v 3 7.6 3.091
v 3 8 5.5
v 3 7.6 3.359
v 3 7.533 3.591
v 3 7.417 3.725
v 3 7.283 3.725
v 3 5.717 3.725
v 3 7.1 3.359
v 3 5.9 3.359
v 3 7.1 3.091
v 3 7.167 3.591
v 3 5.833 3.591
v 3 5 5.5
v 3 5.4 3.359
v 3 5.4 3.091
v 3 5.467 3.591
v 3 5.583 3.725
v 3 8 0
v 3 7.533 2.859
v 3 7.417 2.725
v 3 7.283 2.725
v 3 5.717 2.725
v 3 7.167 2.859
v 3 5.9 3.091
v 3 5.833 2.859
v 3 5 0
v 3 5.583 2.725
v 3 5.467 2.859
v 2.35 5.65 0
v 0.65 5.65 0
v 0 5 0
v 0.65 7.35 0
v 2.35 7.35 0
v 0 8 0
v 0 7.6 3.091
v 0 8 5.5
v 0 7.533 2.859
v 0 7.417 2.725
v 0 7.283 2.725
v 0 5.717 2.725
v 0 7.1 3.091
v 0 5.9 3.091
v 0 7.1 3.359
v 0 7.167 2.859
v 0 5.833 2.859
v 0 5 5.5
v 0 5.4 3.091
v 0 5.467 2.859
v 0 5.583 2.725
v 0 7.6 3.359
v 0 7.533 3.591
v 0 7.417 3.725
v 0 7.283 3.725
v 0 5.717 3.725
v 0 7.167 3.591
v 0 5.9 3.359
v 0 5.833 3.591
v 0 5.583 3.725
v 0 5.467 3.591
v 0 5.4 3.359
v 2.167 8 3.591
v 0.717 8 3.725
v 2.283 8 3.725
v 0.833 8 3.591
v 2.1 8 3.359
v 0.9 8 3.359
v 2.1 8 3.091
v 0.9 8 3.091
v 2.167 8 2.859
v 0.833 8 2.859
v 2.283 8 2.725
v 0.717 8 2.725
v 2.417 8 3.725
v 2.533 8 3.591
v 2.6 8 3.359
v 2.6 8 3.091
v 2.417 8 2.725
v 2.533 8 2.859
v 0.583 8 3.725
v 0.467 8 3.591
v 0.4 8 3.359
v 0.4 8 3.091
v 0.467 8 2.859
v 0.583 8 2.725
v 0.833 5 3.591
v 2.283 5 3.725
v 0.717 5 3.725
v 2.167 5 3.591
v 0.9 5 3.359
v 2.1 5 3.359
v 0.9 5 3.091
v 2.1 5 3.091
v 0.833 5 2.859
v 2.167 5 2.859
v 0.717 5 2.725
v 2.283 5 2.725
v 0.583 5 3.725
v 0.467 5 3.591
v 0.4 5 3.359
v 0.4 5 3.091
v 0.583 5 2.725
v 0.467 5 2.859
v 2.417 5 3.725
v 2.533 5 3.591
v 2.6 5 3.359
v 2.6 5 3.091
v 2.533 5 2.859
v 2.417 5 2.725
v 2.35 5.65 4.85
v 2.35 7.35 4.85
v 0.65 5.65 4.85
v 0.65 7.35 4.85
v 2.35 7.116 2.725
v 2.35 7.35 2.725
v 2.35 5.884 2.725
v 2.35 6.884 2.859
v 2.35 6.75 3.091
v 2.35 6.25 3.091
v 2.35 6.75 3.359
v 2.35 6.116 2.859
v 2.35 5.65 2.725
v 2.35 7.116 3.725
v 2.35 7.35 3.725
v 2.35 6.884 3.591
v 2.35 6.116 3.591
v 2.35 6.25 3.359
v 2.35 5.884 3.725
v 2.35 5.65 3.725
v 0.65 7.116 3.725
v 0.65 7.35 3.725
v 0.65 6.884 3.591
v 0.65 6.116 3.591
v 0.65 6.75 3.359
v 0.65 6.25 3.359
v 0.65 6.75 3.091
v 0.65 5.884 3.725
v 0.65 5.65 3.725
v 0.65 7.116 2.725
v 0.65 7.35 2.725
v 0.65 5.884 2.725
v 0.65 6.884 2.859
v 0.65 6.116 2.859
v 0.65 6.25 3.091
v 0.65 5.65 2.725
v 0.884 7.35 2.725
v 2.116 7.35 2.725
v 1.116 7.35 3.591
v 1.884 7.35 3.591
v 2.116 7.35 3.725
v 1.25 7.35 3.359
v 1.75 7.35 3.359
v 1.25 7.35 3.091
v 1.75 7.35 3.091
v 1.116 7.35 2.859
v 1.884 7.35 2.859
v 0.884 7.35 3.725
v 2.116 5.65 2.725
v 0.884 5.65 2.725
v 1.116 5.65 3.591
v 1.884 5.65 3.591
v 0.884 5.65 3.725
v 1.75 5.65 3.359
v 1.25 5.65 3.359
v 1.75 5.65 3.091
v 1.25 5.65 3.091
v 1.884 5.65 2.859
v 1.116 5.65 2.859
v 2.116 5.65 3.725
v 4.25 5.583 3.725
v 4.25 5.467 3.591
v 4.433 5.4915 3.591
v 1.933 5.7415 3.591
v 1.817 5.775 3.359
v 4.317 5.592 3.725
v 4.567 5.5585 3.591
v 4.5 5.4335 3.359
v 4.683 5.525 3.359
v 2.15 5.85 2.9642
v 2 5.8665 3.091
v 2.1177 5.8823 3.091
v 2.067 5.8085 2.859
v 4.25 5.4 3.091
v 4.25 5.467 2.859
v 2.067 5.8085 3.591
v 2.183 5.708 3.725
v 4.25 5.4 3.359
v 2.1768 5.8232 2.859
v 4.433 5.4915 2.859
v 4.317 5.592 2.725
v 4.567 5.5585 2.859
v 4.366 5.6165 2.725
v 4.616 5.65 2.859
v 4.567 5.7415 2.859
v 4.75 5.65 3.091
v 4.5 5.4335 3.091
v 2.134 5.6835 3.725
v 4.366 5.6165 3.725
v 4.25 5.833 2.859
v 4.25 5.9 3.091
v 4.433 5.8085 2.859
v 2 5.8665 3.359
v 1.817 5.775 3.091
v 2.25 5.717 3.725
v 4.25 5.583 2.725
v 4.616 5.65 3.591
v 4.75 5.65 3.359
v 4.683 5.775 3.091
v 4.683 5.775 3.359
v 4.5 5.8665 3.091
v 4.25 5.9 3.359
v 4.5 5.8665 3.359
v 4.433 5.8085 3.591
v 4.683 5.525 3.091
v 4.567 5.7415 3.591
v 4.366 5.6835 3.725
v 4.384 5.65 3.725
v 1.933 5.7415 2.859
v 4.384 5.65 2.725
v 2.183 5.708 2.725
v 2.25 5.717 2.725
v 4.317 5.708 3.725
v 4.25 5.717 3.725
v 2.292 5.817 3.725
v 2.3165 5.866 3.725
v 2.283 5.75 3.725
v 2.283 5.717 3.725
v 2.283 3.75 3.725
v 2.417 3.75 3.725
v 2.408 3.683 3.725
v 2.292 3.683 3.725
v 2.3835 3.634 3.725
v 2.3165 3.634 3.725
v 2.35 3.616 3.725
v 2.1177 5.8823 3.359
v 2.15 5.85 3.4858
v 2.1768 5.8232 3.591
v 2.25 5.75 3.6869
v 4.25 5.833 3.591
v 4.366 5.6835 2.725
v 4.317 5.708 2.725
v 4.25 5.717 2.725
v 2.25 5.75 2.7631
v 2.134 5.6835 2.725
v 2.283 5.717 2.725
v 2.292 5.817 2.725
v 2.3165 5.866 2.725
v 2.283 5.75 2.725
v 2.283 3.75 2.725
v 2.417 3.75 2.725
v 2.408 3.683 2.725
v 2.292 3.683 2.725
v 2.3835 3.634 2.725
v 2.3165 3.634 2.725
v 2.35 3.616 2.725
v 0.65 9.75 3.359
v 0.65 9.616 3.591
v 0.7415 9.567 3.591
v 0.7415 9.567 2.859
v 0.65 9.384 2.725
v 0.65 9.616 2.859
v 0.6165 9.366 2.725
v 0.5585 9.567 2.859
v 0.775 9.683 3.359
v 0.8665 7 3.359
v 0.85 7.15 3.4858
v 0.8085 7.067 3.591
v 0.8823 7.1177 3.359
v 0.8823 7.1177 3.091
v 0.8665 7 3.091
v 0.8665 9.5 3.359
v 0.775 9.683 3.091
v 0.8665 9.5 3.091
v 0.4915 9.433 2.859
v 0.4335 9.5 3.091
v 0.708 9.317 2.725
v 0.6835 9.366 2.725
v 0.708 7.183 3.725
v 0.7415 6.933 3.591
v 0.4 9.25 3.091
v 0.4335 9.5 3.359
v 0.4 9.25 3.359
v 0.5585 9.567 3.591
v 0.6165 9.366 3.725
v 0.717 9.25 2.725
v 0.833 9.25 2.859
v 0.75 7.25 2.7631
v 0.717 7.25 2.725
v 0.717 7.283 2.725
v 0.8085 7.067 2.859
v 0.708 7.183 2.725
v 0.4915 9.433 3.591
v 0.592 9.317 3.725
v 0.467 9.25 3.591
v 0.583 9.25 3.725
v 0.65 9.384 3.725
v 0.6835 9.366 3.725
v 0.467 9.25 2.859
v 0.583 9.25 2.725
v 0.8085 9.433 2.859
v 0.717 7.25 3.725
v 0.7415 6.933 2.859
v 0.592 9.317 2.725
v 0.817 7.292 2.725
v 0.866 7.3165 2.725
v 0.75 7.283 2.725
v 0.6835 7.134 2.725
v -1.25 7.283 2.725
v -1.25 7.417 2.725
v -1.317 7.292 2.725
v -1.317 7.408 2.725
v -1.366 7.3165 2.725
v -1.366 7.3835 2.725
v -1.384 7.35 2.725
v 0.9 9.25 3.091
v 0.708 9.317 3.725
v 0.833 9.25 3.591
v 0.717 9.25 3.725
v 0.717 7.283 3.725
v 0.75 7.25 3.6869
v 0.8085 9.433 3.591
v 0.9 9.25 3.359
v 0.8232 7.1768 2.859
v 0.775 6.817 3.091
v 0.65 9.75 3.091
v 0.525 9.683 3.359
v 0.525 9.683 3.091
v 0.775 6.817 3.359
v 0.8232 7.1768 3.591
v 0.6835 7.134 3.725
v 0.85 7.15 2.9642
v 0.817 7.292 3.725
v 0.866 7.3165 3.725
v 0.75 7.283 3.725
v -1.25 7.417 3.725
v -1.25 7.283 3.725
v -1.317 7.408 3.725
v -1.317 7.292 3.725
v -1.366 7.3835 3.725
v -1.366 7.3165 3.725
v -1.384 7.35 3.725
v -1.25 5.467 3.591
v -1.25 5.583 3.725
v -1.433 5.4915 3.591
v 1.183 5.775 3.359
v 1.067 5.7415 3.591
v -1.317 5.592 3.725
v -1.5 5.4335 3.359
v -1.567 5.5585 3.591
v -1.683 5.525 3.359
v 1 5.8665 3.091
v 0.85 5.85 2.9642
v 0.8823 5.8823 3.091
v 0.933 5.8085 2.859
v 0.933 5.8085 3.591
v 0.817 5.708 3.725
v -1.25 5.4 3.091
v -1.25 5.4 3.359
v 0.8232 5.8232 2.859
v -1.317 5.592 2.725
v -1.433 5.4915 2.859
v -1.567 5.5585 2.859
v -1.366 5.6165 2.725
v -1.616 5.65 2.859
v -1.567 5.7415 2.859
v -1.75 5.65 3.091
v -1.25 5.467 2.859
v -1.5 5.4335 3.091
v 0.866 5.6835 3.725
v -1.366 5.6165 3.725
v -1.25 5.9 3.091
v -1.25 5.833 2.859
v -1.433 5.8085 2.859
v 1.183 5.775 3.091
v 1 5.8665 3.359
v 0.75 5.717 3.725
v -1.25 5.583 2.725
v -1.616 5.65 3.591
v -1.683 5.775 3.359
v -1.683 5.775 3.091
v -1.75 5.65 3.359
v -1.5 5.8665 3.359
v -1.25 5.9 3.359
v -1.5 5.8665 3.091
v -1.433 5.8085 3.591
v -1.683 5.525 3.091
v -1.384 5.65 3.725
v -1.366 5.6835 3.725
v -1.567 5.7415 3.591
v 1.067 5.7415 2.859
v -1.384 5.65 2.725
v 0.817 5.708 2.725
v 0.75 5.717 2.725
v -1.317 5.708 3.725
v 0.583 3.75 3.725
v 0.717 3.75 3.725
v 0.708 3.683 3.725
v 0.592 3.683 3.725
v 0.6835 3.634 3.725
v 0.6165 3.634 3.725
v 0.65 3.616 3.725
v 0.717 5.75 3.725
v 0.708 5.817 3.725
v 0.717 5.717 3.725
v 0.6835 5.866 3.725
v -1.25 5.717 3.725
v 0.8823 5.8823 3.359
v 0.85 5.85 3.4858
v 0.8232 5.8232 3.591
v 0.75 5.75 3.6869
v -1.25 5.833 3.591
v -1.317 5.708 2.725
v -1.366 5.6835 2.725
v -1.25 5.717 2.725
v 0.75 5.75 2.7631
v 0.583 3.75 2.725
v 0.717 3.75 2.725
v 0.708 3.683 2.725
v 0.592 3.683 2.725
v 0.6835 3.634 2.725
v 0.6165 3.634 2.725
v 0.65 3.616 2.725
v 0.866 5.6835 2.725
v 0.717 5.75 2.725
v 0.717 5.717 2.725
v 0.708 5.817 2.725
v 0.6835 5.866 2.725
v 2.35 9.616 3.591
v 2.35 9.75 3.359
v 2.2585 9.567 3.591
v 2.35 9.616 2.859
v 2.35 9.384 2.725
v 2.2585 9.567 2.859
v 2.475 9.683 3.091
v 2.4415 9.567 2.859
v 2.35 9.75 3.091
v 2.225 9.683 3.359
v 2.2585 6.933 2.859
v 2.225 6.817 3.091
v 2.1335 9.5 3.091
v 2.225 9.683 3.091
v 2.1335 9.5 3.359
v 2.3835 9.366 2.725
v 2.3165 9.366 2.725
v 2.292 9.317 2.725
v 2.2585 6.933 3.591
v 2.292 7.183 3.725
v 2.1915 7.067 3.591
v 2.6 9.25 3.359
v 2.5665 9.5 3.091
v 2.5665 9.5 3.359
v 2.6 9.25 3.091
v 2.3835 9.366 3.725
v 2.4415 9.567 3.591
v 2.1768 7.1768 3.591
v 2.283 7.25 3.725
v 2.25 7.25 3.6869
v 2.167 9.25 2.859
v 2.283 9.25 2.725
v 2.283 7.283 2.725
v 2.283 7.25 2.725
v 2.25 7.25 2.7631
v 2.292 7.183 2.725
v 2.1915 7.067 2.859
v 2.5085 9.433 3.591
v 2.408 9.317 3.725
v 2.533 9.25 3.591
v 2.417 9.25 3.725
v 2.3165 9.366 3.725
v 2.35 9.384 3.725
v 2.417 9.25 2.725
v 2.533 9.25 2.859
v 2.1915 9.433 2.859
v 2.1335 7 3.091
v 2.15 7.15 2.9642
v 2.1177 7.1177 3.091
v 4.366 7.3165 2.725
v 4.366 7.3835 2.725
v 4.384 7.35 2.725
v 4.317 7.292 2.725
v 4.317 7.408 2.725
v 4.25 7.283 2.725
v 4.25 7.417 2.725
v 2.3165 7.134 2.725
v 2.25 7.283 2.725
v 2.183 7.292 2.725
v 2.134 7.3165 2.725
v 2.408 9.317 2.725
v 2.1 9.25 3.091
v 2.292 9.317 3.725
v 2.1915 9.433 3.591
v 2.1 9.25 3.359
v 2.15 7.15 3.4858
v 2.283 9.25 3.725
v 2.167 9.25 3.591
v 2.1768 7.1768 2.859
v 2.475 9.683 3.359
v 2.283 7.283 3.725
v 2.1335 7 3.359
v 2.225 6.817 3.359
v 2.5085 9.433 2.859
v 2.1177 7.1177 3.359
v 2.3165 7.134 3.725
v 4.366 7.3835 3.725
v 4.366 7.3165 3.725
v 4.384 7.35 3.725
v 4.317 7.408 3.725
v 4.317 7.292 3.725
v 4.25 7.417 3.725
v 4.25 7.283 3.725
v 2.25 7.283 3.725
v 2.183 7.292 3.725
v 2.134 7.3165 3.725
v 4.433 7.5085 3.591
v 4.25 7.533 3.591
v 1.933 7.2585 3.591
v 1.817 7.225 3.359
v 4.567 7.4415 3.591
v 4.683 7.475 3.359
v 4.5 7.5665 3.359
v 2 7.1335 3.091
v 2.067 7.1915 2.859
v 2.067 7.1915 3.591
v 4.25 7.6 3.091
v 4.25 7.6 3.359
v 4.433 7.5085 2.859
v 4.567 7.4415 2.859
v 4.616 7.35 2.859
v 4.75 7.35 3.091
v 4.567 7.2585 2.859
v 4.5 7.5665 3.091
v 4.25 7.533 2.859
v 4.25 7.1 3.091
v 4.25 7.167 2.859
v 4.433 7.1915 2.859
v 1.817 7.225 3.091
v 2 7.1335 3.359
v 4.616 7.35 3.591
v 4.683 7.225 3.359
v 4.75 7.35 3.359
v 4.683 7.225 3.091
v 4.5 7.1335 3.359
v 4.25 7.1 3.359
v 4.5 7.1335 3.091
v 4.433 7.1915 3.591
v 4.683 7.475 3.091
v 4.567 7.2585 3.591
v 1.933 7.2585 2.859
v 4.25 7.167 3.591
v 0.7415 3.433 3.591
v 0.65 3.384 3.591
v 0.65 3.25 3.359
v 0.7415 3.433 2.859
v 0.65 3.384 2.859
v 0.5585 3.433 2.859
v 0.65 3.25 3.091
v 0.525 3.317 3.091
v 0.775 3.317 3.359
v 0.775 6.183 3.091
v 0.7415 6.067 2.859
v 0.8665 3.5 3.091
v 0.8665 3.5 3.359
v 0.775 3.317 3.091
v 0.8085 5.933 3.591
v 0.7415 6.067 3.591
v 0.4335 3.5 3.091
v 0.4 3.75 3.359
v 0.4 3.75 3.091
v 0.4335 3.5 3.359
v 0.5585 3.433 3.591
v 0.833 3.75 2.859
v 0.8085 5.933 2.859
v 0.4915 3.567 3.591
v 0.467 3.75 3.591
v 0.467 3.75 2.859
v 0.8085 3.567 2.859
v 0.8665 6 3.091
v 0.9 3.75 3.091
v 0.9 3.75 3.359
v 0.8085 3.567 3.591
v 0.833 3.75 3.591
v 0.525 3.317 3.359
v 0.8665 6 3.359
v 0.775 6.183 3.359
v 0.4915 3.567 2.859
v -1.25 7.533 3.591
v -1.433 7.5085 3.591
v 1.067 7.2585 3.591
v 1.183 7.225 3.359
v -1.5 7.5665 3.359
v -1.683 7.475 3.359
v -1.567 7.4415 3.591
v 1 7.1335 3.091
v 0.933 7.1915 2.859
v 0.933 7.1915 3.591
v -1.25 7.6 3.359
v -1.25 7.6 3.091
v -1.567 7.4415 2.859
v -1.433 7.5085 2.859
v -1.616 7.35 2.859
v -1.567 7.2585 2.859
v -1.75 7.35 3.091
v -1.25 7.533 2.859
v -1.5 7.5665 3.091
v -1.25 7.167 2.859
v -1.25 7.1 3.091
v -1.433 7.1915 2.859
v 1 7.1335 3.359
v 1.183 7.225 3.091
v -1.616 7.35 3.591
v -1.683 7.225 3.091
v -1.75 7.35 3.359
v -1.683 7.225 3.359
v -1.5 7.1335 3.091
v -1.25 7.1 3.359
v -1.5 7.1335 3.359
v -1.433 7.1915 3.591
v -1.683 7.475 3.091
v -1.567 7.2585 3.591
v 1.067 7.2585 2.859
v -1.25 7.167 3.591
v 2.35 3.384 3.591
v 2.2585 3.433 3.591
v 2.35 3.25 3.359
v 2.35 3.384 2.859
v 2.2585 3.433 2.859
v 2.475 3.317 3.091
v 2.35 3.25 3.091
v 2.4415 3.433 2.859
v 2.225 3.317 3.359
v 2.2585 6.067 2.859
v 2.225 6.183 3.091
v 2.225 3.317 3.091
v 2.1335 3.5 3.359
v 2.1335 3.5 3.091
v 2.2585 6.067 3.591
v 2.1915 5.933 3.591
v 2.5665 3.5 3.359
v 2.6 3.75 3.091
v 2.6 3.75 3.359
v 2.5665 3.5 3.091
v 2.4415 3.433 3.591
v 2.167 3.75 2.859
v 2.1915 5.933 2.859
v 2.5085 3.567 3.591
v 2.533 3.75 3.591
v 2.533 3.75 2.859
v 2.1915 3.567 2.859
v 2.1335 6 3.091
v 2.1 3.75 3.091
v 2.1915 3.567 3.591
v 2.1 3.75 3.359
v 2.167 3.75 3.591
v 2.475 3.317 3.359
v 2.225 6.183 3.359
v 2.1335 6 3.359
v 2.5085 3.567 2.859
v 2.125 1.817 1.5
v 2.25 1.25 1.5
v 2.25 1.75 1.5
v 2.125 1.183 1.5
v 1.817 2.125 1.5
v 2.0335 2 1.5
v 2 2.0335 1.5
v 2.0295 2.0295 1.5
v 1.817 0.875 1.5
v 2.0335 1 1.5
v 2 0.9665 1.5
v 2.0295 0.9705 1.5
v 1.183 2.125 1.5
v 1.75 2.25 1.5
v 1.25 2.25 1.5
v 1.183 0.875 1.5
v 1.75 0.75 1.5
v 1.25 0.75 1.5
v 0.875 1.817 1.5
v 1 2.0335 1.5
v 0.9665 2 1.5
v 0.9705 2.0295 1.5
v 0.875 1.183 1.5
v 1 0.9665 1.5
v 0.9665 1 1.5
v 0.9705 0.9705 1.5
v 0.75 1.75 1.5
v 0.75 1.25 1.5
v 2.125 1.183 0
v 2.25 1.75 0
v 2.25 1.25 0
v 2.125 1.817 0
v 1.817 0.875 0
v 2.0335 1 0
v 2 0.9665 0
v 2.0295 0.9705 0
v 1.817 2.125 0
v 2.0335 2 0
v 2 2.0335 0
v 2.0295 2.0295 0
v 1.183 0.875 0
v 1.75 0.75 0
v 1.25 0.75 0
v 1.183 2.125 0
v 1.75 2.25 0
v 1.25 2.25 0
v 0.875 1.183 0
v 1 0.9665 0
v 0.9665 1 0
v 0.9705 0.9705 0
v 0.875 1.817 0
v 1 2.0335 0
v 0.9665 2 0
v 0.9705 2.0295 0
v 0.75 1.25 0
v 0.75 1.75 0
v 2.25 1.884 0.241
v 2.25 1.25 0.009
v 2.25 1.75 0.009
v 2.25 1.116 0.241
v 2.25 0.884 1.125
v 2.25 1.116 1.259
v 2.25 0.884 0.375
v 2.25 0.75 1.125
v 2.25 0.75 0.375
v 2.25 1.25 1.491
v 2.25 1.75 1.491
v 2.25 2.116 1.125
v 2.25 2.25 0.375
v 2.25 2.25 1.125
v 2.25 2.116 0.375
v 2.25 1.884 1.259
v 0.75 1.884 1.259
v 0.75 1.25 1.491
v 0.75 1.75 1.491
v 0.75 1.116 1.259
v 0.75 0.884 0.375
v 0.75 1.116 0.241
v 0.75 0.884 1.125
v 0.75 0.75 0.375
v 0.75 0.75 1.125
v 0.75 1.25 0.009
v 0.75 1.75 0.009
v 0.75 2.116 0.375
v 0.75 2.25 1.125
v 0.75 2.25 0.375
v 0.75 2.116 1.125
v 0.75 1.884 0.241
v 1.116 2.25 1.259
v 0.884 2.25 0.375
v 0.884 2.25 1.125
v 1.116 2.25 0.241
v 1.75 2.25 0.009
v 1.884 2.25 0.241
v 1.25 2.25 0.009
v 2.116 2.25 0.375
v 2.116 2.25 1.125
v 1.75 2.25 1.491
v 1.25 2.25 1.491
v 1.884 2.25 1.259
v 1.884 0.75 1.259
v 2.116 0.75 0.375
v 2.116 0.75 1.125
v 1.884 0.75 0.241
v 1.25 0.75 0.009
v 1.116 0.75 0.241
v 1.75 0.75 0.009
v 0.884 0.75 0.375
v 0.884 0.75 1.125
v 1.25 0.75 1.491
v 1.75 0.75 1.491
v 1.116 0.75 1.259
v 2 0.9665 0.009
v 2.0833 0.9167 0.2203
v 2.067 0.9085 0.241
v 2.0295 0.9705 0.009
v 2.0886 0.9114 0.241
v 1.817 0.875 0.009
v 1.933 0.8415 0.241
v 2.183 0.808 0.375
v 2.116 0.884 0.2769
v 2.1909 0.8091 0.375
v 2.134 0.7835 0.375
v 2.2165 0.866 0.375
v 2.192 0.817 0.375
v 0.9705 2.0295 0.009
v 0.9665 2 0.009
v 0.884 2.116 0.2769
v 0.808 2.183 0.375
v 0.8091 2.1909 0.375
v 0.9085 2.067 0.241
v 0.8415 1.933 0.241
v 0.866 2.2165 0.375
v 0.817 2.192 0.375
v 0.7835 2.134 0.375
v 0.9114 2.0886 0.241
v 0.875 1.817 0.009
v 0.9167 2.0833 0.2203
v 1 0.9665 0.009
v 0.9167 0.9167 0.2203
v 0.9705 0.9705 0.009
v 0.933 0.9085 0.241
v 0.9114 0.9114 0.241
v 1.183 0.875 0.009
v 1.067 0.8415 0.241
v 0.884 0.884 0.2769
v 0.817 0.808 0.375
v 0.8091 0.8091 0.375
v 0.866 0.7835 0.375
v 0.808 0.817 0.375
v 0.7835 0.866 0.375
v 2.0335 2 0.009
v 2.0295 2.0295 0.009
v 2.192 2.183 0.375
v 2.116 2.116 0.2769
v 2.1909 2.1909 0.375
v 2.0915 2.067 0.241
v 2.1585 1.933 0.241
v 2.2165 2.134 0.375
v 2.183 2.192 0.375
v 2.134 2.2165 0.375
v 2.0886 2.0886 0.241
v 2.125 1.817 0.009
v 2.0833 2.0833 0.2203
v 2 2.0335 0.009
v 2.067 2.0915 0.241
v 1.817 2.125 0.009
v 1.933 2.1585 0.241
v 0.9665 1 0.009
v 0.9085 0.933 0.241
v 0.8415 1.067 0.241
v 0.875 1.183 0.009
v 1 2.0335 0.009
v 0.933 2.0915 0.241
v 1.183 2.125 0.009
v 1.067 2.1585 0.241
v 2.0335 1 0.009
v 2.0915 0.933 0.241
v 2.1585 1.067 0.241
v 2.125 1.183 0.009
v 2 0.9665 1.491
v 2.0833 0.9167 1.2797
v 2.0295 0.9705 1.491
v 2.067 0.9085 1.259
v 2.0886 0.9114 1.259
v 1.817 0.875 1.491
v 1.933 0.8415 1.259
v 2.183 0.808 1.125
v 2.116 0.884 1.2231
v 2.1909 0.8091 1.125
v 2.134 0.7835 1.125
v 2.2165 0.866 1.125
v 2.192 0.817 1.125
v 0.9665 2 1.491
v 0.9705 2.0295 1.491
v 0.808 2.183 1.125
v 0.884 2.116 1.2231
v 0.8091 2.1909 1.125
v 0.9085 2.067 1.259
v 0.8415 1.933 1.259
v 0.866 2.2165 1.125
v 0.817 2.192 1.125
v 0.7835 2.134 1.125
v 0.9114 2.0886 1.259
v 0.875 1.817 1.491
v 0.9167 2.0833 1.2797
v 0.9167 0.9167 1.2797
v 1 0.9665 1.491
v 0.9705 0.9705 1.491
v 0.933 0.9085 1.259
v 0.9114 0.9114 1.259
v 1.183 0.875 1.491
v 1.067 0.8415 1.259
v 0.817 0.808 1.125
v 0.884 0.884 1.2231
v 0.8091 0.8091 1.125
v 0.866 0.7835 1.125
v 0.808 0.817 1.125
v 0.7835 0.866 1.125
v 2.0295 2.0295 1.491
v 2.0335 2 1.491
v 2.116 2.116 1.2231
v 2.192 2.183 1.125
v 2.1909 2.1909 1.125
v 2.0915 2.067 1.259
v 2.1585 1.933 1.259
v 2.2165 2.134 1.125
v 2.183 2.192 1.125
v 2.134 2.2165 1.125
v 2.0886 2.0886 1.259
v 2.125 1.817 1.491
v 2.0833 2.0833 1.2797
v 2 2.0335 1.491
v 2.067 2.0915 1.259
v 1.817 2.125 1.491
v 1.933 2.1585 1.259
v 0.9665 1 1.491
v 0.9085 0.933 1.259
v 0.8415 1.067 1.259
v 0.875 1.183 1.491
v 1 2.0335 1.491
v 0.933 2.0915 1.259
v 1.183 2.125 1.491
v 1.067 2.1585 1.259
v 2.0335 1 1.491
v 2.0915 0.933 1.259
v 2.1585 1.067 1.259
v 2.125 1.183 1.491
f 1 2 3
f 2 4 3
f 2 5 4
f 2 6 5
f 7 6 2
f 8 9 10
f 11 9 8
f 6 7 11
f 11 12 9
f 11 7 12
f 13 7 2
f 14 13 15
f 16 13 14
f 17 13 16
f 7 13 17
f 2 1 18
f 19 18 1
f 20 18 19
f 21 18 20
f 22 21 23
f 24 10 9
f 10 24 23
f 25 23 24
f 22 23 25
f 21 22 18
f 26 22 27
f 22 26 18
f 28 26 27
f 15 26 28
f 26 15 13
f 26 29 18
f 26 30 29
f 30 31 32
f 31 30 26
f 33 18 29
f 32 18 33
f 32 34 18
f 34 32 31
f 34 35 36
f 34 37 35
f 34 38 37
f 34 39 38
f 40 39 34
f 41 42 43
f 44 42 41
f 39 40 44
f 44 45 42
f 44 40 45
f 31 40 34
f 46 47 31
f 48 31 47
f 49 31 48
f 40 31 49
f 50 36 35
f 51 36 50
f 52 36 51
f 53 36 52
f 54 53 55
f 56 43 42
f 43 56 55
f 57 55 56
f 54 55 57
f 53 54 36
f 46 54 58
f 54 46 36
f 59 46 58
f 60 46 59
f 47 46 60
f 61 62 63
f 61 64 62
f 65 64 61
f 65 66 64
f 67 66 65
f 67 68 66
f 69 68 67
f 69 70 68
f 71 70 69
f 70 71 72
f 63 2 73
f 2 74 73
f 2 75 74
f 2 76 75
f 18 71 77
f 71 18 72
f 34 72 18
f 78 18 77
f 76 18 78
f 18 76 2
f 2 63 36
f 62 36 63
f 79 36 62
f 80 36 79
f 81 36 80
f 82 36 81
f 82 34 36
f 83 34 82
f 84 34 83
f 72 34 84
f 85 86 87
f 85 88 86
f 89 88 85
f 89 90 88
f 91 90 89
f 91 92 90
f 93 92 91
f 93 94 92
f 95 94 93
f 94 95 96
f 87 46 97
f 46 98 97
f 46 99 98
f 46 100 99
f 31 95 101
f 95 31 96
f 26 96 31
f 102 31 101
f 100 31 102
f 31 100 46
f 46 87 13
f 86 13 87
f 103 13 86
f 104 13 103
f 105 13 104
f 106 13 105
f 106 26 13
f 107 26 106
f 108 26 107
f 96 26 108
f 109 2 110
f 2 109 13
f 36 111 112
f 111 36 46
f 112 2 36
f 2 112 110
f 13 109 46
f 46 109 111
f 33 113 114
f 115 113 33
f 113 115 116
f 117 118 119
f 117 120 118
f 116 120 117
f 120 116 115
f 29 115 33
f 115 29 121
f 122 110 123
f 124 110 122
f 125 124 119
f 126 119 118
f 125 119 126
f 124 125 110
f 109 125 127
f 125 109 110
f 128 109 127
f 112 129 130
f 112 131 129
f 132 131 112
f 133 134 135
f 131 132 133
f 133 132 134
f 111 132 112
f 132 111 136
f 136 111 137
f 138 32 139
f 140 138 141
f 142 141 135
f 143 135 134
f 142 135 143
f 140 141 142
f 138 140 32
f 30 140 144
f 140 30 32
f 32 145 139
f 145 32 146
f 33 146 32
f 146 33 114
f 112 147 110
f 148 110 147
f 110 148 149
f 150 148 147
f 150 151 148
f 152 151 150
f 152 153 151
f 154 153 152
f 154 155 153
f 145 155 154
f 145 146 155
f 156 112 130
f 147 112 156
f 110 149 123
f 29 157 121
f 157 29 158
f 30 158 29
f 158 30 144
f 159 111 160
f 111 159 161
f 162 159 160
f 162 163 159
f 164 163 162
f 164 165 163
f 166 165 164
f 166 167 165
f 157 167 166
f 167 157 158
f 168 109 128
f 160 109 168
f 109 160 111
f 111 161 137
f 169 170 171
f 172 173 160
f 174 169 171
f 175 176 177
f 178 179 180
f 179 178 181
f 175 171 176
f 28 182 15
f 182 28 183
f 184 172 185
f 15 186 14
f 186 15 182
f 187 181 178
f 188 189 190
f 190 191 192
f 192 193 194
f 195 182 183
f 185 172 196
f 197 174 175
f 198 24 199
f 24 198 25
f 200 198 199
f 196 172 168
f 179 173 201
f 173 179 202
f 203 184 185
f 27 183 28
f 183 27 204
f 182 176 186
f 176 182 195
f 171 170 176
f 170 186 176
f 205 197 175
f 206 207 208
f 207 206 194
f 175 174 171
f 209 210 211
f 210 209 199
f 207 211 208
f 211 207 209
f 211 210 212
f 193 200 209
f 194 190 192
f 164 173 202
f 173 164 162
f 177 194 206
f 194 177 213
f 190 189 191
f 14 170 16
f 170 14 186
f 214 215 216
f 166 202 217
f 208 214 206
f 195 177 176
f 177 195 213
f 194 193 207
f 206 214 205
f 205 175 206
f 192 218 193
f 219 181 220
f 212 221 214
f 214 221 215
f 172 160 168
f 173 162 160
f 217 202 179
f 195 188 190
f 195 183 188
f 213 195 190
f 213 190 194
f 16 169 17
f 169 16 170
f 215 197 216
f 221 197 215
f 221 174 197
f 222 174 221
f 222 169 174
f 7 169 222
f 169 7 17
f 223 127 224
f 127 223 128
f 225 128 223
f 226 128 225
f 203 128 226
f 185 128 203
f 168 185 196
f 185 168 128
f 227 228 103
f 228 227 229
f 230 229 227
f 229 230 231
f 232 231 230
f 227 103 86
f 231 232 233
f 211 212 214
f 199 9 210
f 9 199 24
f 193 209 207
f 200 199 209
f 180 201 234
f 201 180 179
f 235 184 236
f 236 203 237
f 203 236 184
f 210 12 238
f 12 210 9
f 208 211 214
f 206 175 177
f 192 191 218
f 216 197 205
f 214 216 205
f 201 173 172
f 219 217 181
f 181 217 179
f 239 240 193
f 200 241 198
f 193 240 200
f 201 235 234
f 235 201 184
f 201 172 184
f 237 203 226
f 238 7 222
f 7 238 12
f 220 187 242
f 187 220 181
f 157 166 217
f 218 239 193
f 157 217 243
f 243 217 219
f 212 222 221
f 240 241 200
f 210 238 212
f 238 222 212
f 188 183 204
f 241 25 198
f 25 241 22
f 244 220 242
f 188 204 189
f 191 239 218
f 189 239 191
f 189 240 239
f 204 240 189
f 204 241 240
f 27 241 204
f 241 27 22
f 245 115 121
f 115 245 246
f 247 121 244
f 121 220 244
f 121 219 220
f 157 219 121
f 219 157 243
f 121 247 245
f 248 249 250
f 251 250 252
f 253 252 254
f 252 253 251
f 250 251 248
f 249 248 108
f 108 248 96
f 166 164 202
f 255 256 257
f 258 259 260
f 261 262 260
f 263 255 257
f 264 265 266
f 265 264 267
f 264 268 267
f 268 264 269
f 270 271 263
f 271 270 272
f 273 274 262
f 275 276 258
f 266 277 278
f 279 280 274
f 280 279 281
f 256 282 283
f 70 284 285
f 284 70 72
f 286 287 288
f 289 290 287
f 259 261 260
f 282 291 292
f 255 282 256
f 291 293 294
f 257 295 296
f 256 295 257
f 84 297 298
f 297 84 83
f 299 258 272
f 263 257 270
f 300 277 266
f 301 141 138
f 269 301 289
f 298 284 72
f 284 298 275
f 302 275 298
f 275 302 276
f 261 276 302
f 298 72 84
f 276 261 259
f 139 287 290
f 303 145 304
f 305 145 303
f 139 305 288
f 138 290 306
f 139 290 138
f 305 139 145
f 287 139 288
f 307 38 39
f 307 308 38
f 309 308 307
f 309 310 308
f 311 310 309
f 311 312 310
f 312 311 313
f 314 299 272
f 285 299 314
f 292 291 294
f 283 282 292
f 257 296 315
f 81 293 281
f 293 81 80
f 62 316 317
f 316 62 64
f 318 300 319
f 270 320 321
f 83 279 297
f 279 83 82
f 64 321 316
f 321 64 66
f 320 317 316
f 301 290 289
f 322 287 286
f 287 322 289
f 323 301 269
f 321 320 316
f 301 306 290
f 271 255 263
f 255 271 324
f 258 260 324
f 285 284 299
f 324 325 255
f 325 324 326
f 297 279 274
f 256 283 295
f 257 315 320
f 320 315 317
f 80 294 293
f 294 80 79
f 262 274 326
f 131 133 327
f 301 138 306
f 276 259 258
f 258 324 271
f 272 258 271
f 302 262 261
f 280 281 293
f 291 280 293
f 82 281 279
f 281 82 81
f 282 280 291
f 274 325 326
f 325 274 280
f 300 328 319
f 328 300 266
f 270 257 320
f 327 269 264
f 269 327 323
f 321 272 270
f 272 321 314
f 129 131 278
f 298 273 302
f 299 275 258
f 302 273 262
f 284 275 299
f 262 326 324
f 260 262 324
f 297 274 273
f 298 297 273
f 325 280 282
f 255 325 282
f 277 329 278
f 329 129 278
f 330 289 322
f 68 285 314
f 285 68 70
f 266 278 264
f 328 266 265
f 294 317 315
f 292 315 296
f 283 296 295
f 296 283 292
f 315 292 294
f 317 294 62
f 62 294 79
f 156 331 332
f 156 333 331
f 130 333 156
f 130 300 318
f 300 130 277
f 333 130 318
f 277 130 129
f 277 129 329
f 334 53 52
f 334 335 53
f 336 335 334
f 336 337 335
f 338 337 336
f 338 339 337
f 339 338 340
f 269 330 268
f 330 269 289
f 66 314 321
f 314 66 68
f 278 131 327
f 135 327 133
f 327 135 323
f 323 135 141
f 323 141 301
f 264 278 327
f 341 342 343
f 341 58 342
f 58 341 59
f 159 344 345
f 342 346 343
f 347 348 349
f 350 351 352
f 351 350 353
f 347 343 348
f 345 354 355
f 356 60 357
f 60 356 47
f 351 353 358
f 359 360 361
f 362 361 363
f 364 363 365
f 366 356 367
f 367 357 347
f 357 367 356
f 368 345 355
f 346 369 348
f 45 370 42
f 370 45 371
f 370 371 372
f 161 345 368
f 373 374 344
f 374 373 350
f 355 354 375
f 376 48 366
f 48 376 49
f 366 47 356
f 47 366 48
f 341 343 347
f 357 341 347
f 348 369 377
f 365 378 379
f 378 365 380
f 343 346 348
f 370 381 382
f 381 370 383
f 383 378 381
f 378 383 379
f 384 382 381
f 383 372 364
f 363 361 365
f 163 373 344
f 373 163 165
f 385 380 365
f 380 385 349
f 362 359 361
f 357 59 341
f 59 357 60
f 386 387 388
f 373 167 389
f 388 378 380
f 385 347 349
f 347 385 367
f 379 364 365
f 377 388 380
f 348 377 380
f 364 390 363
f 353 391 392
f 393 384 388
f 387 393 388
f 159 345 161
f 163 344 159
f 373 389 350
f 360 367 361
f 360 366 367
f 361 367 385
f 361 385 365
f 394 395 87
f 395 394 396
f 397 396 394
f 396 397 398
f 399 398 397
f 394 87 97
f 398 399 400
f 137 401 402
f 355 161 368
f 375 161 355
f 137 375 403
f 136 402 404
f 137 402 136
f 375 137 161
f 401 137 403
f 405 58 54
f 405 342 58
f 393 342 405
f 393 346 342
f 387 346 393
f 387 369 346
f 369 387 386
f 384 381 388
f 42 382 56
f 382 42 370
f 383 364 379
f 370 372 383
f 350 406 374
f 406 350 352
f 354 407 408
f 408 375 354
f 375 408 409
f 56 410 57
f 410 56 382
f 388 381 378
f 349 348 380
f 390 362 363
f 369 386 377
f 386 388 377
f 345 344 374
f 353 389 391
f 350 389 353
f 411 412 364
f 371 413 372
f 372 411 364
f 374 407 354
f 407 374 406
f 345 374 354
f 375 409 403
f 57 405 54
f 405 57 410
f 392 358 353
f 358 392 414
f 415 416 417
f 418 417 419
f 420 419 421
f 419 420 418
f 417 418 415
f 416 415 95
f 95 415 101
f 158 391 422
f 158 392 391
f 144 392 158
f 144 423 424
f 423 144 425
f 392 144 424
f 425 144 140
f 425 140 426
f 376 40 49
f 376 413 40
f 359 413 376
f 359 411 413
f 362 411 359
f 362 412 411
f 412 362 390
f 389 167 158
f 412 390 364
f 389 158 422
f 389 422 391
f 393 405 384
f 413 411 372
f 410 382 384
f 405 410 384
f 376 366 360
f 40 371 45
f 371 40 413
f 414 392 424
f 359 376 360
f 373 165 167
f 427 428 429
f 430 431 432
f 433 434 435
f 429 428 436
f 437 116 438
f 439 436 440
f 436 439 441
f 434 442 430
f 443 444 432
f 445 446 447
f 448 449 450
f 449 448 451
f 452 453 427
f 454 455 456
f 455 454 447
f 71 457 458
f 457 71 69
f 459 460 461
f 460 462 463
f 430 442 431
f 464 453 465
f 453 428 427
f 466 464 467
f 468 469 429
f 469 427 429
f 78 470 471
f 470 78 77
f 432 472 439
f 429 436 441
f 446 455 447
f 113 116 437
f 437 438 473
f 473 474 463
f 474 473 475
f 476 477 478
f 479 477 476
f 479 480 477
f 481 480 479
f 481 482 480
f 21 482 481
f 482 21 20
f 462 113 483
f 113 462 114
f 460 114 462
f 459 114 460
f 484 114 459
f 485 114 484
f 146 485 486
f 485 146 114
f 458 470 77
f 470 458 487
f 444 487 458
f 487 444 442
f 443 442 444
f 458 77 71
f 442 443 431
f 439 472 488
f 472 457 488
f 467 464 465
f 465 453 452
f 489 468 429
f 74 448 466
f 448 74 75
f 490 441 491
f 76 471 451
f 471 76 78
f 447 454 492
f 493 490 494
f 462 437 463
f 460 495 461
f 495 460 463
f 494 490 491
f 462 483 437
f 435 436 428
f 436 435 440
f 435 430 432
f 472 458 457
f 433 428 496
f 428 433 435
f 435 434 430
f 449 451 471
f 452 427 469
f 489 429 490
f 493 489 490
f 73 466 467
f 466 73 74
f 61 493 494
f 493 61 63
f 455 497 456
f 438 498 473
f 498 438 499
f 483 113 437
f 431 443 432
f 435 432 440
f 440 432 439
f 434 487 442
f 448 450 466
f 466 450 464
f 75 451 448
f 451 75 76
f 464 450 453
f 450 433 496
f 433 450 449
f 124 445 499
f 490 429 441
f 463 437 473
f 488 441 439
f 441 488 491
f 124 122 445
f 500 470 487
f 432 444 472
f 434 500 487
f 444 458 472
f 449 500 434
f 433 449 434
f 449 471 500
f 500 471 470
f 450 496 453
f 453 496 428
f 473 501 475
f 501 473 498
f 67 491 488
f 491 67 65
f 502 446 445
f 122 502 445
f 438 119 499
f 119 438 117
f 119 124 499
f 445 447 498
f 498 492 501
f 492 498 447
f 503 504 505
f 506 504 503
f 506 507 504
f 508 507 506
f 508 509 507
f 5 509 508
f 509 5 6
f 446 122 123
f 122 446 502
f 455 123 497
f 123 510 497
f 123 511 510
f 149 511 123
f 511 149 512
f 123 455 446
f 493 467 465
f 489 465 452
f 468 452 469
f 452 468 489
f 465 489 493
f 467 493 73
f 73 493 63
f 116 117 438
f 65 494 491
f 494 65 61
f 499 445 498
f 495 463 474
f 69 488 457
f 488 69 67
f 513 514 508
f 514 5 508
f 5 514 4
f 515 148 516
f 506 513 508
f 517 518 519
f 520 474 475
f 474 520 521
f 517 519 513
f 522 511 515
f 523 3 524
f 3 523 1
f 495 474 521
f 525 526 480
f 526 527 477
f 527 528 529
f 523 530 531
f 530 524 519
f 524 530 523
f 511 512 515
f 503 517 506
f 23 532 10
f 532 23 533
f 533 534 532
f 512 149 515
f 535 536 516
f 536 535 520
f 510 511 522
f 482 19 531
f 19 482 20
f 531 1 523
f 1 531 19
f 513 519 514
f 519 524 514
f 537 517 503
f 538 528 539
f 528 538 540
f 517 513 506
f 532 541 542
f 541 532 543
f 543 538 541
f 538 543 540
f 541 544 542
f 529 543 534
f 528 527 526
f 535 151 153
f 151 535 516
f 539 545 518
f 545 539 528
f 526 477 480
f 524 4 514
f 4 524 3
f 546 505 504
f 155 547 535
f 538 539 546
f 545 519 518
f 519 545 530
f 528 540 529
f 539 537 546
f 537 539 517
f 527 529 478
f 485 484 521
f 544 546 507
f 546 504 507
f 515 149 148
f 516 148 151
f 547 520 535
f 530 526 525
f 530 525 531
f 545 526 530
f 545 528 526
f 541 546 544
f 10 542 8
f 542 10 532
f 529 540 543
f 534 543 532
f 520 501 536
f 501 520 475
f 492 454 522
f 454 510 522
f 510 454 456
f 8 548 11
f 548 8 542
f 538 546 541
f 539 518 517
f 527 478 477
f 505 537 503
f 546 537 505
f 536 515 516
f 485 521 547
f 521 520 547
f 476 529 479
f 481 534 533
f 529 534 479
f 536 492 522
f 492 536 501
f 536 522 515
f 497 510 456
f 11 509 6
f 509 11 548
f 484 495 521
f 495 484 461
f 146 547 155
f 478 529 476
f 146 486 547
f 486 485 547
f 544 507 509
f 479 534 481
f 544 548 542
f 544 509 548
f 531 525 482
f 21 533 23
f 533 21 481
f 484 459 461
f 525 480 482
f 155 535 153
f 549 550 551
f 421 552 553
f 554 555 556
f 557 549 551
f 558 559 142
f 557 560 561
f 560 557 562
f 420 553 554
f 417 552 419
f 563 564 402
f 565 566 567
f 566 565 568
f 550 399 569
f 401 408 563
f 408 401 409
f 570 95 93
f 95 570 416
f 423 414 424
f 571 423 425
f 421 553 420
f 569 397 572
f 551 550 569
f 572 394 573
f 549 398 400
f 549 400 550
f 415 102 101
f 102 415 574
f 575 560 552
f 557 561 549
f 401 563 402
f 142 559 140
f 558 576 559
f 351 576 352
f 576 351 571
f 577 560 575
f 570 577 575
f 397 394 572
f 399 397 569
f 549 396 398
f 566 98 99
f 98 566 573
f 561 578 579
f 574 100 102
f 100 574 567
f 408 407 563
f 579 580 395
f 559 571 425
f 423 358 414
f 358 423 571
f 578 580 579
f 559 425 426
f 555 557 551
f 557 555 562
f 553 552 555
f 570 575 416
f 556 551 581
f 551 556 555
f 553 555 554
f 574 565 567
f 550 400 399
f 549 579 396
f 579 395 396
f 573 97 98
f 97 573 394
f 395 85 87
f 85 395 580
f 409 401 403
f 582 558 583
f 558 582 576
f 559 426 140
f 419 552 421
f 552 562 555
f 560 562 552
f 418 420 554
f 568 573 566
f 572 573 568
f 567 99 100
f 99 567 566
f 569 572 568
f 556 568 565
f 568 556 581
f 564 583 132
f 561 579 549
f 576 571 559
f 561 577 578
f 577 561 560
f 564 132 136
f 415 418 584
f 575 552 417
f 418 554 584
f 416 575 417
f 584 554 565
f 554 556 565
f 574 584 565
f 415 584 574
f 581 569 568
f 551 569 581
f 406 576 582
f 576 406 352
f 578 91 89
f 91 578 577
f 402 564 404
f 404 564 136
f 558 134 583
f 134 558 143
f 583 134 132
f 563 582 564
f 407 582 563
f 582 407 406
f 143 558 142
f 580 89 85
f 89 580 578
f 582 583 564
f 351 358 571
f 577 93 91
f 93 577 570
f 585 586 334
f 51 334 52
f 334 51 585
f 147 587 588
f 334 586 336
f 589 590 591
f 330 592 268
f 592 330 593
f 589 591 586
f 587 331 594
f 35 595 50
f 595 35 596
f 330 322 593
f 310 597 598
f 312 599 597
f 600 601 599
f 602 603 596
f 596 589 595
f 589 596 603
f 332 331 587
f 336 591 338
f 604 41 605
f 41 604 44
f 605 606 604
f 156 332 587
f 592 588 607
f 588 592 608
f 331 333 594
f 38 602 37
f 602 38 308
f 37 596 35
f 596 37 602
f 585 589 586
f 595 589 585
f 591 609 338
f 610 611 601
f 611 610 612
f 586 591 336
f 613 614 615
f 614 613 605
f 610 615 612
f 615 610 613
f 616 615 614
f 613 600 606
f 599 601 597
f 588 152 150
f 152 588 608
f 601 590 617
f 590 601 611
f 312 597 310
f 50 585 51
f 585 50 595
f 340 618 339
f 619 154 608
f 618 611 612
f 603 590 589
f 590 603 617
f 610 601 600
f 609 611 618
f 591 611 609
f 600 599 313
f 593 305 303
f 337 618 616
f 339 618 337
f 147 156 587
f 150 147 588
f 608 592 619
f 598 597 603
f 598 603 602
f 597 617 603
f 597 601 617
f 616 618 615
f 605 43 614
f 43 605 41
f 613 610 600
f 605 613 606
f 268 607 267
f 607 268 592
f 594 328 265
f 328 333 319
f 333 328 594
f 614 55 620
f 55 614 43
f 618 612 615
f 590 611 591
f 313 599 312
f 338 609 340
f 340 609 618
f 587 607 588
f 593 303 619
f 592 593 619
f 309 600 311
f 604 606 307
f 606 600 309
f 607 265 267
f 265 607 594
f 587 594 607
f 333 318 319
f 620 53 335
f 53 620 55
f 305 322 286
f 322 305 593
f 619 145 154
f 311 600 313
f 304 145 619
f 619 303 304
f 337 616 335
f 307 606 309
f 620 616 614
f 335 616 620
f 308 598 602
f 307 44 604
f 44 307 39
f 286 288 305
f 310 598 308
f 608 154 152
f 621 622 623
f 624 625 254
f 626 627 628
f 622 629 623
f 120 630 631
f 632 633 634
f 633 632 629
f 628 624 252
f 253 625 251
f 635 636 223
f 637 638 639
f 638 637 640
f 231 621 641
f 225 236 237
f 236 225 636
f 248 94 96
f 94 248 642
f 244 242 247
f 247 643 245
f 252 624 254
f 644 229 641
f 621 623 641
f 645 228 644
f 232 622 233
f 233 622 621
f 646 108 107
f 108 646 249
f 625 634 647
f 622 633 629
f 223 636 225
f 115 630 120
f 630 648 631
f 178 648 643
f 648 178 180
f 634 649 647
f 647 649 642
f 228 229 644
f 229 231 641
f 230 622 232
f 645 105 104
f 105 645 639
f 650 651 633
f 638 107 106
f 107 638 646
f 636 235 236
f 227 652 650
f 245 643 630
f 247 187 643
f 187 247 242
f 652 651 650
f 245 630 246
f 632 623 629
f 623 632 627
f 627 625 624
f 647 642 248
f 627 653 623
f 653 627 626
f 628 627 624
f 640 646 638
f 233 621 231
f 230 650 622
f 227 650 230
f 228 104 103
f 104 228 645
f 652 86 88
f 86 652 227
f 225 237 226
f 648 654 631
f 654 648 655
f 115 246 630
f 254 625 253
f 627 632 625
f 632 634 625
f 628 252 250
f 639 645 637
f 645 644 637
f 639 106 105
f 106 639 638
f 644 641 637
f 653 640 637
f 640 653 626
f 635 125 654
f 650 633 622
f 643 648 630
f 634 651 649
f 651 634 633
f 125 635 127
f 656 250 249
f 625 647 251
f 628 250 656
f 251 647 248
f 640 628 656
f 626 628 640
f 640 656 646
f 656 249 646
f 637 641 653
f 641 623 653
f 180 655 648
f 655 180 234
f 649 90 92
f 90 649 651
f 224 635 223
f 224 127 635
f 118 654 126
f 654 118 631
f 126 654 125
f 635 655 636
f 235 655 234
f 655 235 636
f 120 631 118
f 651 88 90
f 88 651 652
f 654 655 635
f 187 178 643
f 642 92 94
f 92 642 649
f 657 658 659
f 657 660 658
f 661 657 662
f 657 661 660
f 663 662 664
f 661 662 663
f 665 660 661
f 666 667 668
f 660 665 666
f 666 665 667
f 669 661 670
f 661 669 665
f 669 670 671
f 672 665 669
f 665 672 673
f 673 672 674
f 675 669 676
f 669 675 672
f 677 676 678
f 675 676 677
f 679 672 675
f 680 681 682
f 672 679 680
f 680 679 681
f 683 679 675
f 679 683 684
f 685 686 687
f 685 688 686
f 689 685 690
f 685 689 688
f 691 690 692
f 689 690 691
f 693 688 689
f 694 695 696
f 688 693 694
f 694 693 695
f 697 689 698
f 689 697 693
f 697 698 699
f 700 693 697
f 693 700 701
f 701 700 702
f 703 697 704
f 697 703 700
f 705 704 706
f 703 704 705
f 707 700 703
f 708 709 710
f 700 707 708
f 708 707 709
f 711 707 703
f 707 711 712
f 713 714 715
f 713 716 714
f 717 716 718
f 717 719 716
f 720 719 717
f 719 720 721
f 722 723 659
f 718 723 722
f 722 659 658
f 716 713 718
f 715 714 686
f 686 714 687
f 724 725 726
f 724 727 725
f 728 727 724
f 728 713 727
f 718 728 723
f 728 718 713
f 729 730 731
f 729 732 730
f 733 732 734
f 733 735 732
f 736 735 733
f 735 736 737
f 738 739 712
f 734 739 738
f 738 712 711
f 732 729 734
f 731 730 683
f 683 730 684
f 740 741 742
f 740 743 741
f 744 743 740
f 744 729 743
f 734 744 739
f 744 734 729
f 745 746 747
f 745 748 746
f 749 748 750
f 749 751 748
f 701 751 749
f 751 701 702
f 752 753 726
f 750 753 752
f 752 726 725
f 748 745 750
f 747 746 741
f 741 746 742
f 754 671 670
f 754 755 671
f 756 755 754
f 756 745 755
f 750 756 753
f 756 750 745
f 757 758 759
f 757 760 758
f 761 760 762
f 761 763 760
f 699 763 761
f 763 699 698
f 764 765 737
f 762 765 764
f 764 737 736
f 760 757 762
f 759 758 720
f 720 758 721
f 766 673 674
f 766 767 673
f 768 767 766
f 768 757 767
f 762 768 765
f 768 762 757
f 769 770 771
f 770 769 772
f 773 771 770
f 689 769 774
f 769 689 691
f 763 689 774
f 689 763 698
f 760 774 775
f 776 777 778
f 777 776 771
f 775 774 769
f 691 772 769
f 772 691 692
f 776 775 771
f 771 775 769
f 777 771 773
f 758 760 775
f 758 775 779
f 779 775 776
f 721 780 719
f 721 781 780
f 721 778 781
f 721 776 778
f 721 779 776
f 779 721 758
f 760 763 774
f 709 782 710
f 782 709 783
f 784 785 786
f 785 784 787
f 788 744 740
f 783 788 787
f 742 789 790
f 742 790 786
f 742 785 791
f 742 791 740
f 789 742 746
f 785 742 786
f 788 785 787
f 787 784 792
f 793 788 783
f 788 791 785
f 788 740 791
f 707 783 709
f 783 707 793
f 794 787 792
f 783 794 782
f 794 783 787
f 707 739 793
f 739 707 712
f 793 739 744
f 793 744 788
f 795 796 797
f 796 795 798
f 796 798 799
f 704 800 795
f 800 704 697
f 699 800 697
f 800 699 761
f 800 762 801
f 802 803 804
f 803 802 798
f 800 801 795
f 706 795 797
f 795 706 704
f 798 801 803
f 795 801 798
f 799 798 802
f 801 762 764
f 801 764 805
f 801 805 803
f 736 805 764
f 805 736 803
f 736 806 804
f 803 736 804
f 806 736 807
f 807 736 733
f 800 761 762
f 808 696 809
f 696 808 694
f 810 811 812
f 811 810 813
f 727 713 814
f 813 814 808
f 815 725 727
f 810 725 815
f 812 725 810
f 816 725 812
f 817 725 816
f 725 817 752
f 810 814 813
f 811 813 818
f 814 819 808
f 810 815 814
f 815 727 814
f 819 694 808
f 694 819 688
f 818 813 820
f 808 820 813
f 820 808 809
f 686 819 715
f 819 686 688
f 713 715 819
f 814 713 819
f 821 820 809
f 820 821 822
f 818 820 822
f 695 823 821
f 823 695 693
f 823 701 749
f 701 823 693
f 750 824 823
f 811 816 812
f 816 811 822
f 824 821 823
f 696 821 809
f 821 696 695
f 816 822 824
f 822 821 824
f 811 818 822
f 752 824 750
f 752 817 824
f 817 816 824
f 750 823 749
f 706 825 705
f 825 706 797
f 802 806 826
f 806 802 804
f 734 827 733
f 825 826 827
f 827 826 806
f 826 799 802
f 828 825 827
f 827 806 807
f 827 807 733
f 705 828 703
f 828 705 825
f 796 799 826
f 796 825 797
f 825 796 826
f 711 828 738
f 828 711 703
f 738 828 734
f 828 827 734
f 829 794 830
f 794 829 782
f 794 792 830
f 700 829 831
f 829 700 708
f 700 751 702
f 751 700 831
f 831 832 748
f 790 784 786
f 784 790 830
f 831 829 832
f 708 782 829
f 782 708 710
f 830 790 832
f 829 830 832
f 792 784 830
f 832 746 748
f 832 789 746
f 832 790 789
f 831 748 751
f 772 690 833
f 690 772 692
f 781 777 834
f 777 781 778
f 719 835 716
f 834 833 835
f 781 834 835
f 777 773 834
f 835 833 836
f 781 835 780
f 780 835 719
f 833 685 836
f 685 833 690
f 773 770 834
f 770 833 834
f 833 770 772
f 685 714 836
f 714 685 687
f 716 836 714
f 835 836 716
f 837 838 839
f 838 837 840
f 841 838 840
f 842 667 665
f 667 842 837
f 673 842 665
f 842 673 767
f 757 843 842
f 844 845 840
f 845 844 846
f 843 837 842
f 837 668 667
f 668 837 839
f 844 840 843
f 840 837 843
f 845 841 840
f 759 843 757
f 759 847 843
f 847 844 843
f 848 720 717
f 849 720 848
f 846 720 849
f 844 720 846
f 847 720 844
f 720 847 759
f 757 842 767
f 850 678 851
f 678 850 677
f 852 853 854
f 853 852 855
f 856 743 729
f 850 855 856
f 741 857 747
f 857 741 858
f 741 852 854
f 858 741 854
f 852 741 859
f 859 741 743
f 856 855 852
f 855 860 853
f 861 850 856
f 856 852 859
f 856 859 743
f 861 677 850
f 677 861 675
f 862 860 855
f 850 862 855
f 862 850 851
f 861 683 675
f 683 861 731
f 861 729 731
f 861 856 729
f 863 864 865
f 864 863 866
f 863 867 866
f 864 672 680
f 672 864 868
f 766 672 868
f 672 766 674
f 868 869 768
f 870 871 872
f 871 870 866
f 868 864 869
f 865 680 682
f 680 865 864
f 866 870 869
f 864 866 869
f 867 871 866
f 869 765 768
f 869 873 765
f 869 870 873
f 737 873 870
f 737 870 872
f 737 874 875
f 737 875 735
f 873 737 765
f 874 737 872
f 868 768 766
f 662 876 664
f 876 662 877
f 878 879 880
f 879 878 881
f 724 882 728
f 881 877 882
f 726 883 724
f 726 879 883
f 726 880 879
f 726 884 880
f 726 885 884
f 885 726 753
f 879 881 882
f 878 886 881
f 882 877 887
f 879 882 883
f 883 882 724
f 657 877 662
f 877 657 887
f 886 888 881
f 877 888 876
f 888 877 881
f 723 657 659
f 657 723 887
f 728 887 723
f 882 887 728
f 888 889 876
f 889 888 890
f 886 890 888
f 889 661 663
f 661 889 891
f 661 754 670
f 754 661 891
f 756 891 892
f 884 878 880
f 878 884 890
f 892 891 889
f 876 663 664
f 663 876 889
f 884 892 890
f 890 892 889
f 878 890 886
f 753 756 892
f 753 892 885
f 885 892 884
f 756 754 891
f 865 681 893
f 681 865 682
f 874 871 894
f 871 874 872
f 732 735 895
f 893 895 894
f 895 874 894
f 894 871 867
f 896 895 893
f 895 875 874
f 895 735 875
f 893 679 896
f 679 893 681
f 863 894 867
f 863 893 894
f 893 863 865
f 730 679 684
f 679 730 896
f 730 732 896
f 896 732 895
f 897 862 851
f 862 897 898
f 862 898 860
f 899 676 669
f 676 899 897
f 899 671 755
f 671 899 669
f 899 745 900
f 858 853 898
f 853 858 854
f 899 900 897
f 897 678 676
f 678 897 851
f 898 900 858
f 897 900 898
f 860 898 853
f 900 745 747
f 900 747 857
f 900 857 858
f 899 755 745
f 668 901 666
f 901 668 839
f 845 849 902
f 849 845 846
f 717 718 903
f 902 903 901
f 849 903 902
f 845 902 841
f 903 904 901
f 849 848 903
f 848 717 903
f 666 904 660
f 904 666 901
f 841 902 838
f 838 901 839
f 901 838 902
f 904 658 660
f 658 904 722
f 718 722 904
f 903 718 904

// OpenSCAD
// BGSD
include <../lib/boardgame_insert_toolkit_lib.4.scad>;
data = [
    // Source STL: Solo.stl
    // STL bbox min [10, -62, 0] max [47, 68, 56] size [37, 130, 56]
    // Detected compartments: 2; wall thickness: 1.5mm
    [ OBJECT_BOX,
        [ NAME, "Solo" ],
        [ BOX_SIZE_XYZ, [37, 130, 56] ],
        [ BOX_WALL_THICKNESS, 1.5 ],
        [ BOX_NO_LID_B, true ],
        [ BOX_FEATURE,
            [ NAME, "Solo cavity 1" ],
            [ FTR_COMPARTMENT_SIZE_XYZ, [34, 55.5, 54.5] ],
            [ FTR_NUM_COMPARTMENTS_XY, [1, 1] ],
            [ FTR_SHAPE, SQUARE ],
            [ POSITION_XY, [0, 0] ],
        ],
        [ BOX_FEATURE,
            [ NAME, "Solo cavity 2" ],
            [ FTR_COMPARTMENT_SIZE_XYZ, [34, 70, 54.5] ],
            [ FTR_NUM_COMPARTMENTS_XY, [1, 1] ],
            [ FTR_SHAPE, SQUARE ],
            [ POSITION_XY, [0, 57] ],
        ],
    ],
];
Make(data);
